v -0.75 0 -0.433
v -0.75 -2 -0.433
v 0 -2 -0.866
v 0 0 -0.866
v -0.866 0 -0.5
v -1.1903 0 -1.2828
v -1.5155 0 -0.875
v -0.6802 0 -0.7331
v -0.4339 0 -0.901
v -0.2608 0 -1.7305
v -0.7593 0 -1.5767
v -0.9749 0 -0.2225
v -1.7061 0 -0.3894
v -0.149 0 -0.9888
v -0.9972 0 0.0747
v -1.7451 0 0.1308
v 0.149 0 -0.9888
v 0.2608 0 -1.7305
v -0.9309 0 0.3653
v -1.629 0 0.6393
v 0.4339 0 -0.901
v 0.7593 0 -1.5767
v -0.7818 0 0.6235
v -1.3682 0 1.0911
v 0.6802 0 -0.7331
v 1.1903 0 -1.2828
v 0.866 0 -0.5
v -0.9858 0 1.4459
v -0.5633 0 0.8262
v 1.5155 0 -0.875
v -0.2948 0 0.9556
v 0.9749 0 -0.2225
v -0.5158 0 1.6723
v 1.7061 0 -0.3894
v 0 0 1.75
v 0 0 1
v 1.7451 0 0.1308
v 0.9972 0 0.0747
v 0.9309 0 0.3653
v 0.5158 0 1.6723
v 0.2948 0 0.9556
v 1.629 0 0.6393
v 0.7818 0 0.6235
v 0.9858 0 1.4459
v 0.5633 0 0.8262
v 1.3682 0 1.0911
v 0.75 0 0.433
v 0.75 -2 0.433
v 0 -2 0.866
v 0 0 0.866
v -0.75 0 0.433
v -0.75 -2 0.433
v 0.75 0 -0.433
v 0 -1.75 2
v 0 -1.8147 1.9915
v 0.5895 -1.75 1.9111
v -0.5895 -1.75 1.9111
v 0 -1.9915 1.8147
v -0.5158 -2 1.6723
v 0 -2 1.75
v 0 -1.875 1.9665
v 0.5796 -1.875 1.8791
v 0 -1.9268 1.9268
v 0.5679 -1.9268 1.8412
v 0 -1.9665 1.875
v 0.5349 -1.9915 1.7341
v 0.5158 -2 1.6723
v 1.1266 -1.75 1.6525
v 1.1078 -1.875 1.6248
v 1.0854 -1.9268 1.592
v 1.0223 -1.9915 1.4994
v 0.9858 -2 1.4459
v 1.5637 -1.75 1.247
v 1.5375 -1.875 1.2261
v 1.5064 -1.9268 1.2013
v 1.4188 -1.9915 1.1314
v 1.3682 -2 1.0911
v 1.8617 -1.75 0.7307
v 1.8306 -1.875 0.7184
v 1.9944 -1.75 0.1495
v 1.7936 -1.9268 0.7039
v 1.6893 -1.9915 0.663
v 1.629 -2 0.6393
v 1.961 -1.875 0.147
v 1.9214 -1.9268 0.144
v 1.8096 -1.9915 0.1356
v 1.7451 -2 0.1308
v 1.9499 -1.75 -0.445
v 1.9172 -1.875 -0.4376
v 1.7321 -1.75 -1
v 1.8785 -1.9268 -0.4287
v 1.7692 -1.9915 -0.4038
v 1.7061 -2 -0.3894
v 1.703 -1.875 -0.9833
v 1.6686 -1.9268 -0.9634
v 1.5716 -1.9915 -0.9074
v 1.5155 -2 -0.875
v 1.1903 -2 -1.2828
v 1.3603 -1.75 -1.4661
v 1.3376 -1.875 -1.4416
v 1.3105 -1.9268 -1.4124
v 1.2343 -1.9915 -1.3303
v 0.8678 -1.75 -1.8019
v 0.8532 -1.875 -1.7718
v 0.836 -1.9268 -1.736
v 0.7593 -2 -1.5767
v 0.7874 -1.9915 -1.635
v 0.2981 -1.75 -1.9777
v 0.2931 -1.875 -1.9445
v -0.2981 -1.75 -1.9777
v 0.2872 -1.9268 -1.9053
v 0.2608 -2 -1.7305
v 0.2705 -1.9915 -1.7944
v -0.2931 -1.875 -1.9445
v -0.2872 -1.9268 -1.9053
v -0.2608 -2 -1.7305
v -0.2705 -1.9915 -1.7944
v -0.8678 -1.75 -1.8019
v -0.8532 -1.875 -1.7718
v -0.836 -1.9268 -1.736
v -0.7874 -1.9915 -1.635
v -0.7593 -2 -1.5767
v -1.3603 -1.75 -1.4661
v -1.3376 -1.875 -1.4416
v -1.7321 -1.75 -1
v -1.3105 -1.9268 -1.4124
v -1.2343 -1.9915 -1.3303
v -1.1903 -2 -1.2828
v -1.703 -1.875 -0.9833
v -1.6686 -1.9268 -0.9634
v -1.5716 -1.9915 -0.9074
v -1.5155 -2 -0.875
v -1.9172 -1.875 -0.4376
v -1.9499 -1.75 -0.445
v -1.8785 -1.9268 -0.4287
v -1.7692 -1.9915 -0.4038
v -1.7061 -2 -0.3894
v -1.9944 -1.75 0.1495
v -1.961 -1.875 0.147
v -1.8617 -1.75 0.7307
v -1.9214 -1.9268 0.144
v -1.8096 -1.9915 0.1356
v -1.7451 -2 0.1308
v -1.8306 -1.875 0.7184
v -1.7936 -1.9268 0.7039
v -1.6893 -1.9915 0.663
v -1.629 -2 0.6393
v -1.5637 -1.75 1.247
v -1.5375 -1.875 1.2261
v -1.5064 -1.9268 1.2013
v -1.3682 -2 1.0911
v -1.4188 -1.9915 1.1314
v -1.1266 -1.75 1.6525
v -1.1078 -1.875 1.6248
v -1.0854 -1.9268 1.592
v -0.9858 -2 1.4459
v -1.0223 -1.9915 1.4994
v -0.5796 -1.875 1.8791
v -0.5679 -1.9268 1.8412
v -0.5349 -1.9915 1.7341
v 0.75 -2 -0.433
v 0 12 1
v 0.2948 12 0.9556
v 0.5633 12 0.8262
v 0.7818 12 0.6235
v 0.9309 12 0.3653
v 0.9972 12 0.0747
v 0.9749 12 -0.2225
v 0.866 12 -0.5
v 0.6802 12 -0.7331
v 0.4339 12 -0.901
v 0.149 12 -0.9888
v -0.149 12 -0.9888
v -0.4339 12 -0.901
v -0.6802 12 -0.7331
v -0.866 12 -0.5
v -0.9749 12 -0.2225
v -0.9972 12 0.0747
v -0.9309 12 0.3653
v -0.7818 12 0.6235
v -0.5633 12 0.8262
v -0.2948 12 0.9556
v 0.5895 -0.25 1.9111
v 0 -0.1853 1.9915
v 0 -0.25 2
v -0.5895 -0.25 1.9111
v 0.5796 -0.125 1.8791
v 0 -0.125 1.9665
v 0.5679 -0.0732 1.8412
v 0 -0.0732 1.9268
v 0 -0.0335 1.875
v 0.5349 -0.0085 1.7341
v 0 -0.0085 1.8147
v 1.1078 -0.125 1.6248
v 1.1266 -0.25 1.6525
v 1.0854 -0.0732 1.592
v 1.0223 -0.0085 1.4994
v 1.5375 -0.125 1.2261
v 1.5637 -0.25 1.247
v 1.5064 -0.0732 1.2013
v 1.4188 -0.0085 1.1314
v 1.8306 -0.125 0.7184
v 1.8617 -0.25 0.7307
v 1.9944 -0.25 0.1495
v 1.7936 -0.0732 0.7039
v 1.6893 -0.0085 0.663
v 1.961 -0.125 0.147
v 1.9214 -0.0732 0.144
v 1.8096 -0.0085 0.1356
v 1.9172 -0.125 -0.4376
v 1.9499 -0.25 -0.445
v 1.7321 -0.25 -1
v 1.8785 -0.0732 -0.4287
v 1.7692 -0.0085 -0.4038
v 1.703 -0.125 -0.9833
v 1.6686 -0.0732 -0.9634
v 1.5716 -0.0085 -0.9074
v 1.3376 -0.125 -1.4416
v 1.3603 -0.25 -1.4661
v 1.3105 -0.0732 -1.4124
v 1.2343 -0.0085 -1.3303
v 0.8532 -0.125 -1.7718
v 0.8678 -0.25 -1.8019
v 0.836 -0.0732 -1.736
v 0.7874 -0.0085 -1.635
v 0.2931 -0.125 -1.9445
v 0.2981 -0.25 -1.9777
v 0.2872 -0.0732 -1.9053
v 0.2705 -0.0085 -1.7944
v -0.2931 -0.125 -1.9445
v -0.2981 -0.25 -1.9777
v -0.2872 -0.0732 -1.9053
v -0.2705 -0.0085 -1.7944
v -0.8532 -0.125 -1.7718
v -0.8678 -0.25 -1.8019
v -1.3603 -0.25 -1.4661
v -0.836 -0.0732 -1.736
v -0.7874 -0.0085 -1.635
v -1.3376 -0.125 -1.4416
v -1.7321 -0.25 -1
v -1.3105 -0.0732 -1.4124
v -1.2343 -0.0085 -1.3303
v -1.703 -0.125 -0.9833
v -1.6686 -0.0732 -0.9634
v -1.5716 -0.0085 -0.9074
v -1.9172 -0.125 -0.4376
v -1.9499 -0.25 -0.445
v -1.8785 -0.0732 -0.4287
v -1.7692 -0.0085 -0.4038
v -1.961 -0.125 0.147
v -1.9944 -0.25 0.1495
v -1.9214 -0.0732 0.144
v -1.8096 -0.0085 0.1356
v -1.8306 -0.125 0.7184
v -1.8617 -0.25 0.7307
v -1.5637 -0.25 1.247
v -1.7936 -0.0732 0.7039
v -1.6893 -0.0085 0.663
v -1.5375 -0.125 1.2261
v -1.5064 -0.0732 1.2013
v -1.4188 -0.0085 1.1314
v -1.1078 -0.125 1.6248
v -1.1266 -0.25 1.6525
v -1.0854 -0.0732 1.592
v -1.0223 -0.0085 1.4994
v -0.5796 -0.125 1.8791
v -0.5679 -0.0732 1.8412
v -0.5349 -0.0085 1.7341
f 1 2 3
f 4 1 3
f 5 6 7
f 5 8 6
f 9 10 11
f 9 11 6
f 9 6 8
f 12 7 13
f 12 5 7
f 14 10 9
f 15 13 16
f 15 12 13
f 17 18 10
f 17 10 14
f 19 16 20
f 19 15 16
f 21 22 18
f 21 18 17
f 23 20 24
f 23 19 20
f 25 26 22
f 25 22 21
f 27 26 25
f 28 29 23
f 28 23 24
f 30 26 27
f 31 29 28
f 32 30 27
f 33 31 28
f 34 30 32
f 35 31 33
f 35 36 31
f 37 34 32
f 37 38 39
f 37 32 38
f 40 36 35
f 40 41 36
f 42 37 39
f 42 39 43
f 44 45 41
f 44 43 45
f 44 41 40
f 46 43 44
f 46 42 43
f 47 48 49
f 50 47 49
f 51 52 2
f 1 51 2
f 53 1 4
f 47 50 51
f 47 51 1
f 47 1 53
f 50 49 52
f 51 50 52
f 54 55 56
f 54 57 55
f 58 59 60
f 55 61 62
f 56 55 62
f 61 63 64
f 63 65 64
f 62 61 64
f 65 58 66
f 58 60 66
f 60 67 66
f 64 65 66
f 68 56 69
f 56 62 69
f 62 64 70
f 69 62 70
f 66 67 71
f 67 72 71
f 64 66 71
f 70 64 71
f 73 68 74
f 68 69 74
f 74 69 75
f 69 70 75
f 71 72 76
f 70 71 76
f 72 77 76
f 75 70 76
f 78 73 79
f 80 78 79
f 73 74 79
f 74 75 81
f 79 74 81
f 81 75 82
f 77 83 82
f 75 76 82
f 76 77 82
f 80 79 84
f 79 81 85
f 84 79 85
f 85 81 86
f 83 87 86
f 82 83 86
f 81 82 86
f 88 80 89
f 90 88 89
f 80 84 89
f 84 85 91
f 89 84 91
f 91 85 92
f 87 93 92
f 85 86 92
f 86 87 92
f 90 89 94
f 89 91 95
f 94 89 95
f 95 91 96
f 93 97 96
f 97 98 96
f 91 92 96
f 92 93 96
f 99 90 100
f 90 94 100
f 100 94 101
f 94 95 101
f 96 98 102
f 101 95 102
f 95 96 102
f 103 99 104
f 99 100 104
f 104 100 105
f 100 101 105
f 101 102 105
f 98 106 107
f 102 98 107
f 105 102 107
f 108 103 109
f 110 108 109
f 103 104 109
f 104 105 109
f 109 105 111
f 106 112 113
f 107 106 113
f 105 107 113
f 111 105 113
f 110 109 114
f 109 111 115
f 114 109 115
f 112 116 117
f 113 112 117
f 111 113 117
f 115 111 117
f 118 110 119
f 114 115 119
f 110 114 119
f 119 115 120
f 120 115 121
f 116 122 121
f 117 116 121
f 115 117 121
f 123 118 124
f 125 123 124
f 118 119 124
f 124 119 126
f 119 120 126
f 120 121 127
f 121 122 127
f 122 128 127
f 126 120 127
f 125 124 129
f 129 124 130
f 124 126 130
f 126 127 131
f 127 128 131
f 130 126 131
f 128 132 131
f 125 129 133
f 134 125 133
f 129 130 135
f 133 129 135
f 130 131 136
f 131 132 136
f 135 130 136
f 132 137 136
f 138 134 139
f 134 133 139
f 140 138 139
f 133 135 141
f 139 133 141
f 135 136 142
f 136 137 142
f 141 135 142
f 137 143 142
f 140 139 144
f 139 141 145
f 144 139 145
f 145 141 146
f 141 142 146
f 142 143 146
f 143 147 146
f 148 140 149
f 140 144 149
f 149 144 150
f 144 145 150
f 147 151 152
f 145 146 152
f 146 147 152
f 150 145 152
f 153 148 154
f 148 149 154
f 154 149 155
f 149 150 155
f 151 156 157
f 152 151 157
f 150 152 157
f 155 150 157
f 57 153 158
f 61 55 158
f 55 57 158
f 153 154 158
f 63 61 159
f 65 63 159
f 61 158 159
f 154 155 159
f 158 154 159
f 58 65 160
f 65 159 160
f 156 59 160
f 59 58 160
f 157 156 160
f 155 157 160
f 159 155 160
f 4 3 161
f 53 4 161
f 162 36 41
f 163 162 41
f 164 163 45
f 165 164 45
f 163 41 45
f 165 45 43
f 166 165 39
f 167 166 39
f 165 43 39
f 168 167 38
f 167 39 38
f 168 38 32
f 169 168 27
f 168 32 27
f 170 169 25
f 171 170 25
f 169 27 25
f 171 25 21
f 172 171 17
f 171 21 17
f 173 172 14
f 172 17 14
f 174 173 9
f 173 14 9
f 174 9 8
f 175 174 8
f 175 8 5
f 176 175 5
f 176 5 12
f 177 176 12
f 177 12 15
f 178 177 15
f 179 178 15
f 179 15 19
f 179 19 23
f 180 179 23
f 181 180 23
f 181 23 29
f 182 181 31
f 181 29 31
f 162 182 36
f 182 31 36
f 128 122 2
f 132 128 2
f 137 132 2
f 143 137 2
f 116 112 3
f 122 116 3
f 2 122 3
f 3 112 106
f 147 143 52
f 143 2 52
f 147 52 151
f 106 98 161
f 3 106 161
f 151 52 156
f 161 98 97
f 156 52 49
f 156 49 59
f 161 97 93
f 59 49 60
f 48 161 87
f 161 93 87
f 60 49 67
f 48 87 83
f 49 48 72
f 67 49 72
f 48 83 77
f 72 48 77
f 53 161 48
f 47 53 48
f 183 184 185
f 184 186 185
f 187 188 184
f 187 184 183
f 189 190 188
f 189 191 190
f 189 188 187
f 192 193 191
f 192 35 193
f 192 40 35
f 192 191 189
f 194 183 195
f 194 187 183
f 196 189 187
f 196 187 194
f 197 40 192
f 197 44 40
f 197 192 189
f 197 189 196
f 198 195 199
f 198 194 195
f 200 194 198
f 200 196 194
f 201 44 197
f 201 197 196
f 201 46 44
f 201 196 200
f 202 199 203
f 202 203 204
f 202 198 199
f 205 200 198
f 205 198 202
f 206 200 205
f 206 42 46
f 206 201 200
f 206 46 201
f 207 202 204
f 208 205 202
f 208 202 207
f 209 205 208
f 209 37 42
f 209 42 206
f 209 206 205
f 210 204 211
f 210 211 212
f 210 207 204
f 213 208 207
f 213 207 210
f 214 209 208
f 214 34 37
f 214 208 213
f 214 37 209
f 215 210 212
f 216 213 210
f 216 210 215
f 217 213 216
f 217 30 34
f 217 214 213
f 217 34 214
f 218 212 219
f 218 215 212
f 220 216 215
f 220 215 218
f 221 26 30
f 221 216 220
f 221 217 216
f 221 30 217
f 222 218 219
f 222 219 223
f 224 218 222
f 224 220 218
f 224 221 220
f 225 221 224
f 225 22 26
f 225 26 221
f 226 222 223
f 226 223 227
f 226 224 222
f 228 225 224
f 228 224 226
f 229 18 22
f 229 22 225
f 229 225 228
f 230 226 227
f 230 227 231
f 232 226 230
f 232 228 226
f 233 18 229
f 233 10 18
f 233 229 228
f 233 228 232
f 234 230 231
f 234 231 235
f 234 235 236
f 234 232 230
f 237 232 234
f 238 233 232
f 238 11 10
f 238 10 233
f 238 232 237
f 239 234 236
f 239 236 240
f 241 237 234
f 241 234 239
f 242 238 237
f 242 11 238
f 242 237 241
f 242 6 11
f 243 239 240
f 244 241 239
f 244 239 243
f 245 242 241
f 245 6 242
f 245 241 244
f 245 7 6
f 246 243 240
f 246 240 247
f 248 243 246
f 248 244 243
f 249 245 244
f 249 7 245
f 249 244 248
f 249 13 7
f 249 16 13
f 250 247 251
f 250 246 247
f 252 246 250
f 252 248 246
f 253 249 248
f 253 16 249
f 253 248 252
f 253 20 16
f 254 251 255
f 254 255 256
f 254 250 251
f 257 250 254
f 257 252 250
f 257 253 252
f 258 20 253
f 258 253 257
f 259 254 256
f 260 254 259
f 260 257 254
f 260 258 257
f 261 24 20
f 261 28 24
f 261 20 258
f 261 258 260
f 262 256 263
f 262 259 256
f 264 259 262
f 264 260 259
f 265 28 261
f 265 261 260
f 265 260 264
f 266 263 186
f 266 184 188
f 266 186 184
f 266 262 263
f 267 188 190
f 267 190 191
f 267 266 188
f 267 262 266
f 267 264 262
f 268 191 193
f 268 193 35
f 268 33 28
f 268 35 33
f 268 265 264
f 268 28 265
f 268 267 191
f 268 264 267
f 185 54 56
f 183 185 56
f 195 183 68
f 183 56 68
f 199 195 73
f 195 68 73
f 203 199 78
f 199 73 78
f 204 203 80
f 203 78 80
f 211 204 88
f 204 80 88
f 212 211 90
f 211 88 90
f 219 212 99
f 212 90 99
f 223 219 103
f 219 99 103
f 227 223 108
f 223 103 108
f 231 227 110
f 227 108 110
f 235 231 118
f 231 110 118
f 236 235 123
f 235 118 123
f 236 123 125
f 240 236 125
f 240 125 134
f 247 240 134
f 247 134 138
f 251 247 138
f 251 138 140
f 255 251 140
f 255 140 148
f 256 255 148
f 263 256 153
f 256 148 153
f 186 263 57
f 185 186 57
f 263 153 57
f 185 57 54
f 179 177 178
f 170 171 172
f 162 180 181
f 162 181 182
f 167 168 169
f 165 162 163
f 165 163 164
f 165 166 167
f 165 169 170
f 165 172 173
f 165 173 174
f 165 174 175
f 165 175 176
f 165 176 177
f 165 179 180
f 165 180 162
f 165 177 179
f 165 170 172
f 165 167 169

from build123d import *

# Parameters (mm, degrees)
SKETCH1_R           = 1
BOSS_EXTRUDE1_DEPTH = 12
SKETCH1_3_R         = 2
BOSS_EXTRUDE2_DEPTH = 2
CUT_EXTRUDE1_DEPTH  = 2
FILLET1_R           = 0.25


with BuildPart() as part:
    # Sketch1 → Boss-Extrude1 (new body)
    with BuildSketch(Plane(origin=(0, 0, 0), x_dir=(1, 0, 0), z_dir=(0, 1, 0))):
        Circle(SKETCH1_R)
    extrude(amount=BOSS_EXTRUDE1_DEPTH)

    # Sketch1<3> → Boss-Extrude2 (add)
    with BuildSketch(Plane(origin=(0, 0, 0), x_dir=(1, 0, 0), z_dir=(0, 1, 0))):
        Circle(SKETCH1_3_R)
    extrude(amount=-BOSS_EXTRUDE2_DEPTH)

    # Sketch2 → Cut-Extrude1 (cut)
    with BuildSketch(Plane.XZ.offset(2)):
        Polygon((0, 0.866025404), (-0.75, 0.433012702), (-0.75, -0.433012702), (0, -0.866025404), (0.75, -0.433012702), (0.75, 0.433012702), align=None)
    extrude(amount=-CUT_EXTRUDE1_DEPTH, mode=Mode.SUBTRACT)

    # Fillet1
    fillet1_edges = [part.edges().sort_by_distance(p)[0] for p in [
        (-2, 0, 0),
        (-2, -2, 0),
    ]]
    fillet(fillet1_edges, radius=FILLET1_R)


solid = part.part
